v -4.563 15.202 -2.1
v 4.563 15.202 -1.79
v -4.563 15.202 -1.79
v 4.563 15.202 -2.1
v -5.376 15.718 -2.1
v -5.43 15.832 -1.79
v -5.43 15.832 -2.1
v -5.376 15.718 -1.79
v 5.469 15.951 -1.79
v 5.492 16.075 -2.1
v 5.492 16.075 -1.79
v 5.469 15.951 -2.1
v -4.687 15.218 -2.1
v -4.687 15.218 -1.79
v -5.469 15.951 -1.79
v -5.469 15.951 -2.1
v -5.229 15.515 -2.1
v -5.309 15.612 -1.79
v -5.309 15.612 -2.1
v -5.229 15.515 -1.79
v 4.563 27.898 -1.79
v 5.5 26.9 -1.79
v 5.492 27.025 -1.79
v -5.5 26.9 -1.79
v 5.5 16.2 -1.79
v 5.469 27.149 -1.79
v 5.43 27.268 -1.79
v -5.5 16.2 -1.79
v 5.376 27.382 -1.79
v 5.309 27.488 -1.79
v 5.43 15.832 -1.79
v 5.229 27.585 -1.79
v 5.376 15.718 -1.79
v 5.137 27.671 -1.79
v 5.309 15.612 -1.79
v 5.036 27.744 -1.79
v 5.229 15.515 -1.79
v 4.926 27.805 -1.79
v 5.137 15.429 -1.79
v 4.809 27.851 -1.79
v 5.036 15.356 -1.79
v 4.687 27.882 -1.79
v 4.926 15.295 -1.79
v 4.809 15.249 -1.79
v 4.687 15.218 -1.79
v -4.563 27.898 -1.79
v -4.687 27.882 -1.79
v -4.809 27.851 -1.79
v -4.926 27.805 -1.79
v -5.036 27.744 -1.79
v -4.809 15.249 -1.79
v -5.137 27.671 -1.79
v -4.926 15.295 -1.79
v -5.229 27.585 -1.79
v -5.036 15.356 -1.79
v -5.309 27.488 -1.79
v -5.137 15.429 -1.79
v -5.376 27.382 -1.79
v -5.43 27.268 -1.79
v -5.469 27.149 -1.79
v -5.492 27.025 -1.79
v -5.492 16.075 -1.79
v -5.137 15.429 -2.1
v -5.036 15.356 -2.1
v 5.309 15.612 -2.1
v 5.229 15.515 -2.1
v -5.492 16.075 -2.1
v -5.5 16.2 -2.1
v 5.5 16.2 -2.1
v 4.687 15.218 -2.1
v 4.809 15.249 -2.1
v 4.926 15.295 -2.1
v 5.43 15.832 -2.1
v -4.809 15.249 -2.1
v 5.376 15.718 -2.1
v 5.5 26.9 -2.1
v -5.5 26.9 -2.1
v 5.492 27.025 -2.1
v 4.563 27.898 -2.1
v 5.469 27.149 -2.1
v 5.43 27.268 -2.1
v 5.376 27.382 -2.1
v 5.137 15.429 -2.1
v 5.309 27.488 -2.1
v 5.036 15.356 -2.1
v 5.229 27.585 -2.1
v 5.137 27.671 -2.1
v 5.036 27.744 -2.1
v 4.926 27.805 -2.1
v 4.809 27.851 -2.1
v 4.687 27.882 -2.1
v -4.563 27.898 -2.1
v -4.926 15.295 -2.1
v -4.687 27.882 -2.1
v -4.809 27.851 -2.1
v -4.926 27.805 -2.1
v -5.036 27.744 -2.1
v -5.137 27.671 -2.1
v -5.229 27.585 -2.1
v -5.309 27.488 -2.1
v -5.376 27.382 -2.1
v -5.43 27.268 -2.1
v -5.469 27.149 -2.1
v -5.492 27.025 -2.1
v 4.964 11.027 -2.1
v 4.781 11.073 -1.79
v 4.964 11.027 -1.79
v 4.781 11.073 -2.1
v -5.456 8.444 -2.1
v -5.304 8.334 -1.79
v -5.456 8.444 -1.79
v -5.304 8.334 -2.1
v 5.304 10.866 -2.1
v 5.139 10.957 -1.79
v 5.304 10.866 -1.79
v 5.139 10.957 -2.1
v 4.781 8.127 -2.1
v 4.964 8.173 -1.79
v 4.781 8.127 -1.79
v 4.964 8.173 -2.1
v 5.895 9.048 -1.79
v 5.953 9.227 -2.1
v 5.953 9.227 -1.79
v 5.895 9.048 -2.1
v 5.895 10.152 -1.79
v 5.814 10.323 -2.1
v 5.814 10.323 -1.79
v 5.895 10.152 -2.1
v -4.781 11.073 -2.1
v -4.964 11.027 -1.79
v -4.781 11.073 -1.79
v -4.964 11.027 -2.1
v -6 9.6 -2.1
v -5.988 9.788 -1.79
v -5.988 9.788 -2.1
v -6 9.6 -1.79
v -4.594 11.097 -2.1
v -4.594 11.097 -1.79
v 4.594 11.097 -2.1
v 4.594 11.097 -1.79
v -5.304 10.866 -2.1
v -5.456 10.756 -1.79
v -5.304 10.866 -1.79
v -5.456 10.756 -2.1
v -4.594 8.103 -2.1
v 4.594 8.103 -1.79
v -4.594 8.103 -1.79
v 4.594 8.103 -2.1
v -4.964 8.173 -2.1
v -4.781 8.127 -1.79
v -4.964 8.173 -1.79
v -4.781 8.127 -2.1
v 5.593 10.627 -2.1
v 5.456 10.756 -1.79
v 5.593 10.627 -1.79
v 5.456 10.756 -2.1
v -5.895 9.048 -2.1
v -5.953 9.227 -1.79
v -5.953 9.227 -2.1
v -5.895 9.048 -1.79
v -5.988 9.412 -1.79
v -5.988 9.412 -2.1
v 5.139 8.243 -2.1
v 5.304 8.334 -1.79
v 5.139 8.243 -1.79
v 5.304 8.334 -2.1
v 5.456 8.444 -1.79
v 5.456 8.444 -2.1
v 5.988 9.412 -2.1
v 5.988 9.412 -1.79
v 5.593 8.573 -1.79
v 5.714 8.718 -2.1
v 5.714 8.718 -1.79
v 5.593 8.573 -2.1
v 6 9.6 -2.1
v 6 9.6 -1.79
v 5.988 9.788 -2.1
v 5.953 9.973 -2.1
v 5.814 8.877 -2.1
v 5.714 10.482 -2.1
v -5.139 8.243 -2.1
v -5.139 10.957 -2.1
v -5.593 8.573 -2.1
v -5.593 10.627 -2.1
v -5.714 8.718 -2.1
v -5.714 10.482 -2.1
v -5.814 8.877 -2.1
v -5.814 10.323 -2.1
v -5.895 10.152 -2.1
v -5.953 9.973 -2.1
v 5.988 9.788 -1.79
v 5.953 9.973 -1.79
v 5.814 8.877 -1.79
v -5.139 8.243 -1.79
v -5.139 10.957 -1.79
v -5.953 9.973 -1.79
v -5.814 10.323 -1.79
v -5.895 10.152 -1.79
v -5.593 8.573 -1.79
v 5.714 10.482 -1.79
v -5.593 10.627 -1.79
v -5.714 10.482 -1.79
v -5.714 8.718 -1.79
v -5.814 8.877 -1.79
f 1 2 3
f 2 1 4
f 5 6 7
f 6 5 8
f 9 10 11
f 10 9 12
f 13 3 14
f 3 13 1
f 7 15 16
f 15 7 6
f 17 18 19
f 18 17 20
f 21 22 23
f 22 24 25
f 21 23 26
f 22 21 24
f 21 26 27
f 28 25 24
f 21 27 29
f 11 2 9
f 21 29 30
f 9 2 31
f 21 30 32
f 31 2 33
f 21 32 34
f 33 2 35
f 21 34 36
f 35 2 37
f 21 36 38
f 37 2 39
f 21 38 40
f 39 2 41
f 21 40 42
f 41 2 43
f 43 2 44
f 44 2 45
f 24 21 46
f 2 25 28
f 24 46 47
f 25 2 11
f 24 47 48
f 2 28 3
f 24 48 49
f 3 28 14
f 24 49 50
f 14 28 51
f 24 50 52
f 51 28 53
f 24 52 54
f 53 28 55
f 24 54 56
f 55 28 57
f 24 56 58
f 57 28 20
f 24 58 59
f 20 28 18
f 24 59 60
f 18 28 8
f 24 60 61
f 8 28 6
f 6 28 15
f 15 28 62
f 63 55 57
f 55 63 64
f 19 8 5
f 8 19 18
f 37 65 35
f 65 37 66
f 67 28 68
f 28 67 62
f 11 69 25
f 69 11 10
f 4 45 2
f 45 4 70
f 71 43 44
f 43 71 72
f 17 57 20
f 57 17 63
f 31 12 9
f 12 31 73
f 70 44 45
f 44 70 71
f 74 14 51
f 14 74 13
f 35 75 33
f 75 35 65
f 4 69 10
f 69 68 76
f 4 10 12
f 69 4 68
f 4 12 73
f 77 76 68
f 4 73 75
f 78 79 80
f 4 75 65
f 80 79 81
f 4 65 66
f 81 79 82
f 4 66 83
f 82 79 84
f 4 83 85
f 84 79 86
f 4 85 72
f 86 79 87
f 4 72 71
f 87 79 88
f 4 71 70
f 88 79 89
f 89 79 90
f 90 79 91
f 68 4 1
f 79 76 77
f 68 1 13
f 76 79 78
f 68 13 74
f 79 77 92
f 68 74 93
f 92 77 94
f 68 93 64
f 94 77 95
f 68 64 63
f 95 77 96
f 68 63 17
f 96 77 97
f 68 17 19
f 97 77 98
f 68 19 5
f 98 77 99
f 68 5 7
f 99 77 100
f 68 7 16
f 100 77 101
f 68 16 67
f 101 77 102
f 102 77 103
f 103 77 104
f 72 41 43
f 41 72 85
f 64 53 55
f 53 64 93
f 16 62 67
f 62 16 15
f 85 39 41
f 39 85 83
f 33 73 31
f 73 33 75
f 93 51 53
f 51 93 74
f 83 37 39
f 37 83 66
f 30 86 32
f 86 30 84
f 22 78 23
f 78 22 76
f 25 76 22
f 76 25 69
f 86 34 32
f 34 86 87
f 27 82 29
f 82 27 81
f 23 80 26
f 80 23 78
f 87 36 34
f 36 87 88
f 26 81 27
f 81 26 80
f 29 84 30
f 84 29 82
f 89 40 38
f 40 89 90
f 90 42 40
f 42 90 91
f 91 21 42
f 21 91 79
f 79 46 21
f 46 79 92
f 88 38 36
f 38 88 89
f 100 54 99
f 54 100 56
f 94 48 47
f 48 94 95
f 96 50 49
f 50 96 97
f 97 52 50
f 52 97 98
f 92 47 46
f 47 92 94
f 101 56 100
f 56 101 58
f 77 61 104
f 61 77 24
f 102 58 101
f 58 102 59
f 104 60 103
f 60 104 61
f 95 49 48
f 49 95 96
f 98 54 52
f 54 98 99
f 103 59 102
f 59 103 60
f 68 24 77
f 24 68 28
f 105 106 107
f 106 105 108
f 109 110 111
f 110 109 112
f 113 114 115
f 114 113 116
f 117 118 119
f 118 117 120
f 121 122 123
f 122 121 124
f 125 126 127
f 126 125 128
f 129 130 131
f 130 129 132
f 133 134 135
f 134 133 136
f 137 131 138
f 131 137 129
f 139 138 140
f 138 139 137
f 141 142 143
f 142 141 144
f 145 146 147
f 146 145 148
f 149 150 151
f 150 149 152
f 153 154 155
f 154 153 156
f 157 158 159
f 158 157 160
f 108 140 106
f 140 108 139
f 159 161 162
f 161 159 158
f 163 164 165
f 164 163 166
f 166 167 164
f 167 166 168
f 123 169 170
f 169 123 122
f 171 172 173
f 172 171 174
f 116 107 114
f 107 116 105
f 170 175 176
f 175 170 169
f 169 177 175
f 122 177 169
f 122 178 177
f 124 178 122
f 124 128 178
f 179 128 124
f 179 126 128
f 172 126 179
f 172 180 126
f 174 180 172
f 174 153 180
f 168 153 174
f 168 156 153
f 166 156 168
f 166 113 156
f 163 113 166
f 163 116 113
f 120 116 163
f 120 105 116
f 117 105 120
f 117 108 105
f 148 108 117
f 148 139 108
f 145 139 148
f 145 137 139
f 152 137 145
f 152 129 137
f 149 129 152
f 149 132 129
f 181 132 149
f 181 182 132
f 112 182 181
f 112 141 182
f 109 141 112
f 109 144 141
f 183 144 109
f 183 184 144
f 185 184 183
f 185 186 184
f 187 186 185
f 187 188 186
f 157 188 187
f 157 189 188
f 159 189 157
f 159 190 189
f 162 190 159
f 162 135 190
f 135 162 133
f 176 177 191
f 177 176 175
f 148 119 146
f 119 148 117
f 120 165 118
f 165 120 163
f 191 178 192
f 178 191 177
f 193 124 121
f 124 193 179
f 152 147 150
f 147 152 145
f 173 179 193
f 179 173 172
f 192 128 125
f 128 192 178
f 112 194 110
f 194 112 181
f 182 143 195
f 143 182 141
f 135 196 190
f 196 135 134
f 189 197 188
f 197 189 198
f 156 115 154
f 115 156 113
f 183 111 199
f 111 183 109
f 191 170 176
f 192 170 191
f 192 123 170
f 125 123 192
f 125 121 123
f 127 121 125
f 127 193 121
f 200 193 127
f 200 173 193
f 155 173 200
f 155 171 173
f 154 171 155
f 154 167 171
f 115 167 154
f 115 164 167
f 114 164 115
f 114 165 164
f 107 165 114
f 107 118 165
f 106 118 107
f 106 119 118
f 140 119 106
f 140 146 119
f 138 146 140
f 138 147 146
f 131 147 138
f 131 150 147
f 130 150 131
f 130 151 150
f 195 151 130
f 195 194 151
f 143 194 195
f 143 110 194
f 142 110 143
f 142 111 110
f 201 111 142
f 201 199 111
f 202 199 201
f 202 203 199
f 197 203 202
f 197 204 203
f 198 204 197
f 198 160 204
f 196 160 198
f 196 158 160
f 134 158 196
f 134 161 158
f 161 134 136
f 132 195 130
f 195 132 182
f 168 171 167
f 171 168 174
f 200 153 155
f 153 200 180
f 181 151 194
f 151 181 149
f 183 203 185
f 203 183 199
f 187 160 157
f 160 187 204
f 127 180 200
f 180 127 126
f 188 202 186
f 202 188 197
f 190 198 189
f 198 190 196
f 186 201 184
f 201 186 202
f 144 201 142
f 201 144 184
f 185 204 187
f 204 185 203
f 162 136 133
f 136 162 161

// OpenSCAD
// file: rounded_poly.scad
// Function to create a cylinder extruded from point1 to point2 on the horizontal plane
// The cylinder is vertical at point1 and dragged to point2, filling the space between
// Parameters:
//   point1: [x, y] - Starting point on the horizontal plane
//   point2: [x, y] - Ending point on the horizontal plane
//   radius: Radius of the cylinder
//   height: Vertical height of the cylinder

module cylinder_between_points(point1, point2, radius=1, height=10) {
    // Use hull to fill the space between two vertical cylinders
    hull() {
        // Cylinder at point1
        translate([point1[0], point1[1], 0])
            cylinder(r=radius, h=height, center=false, $fn=50);
        
        // Cylinder at point2
        translate([point2[0], point2[1], 0])
            cylinder(r=radius, h=height, center=false, $fn=50);
    }
}

// Example usage:
// Create a cylinder from point [0, 0] to point [10, 5]
// cylinder_between_points([0, 0], [10, 5], radius=0.5, height=20);

// Function to create cylinders along a sequence of points
// Parameters:
//   points: Array of [x, y] coordinates
//   radius: Radius of the cylinders
//   height: Vertical height of the cylinders
//   fill_polygon: If true, also creates an extruded polygon through all points

module cylinder_path(points, radius=1, height=10, fill_polygon=false) {
    union() {
        // Loop through each consecutive pair of points
        for (i = [0 : len(points) - 2]) {
            cylinder_between_points(points[i], points[i+1], radius, height);
        }
        
        // If fill_polygon is true, close the path and create an extruded polygon
        if (fill_polygon) {
            // Close the path by connecting last point to first point
            cylinder_between_points(points[len(points)-1], points[0], radius, height);
            
            // Create the filled polygon
            linear_extrude(height=height)
                polygon(points);
        }
    }
}

// Example usage of cylinder_path:
// Create a path through multiple points
// cylinder_path([[0, 0], [10, 5], [15, 15], [5, 20]], radius=0.5, height=10, fill_polygon=true);

// Additional examples (commented out):
// cylinder_between_points([5, 5], [15, 10], radius=1, height=15);
// cylinder_between_points([-5, -5], [5, 5], radius=0.75, height=25);
// main file
// Import the rounded_poly module
use <rounded_poly.scad>
$fn=128;

module backplate_mask()
{
    union()
    {

        translate([-4.5,16.2,-2.1])
            cylinder_path([[0, 0],[9.0, 0],[9.0, 10.7],[0, 10.7]],
                            radius=1.0, height=0.31, fill_polygon=true);
                  

        translate([-4.5,9.6,-2.1])
            cylinder_between_points([0, 0], [9, 0], radius=1.5, height=0.31);
    }
}

backplate_mask();
